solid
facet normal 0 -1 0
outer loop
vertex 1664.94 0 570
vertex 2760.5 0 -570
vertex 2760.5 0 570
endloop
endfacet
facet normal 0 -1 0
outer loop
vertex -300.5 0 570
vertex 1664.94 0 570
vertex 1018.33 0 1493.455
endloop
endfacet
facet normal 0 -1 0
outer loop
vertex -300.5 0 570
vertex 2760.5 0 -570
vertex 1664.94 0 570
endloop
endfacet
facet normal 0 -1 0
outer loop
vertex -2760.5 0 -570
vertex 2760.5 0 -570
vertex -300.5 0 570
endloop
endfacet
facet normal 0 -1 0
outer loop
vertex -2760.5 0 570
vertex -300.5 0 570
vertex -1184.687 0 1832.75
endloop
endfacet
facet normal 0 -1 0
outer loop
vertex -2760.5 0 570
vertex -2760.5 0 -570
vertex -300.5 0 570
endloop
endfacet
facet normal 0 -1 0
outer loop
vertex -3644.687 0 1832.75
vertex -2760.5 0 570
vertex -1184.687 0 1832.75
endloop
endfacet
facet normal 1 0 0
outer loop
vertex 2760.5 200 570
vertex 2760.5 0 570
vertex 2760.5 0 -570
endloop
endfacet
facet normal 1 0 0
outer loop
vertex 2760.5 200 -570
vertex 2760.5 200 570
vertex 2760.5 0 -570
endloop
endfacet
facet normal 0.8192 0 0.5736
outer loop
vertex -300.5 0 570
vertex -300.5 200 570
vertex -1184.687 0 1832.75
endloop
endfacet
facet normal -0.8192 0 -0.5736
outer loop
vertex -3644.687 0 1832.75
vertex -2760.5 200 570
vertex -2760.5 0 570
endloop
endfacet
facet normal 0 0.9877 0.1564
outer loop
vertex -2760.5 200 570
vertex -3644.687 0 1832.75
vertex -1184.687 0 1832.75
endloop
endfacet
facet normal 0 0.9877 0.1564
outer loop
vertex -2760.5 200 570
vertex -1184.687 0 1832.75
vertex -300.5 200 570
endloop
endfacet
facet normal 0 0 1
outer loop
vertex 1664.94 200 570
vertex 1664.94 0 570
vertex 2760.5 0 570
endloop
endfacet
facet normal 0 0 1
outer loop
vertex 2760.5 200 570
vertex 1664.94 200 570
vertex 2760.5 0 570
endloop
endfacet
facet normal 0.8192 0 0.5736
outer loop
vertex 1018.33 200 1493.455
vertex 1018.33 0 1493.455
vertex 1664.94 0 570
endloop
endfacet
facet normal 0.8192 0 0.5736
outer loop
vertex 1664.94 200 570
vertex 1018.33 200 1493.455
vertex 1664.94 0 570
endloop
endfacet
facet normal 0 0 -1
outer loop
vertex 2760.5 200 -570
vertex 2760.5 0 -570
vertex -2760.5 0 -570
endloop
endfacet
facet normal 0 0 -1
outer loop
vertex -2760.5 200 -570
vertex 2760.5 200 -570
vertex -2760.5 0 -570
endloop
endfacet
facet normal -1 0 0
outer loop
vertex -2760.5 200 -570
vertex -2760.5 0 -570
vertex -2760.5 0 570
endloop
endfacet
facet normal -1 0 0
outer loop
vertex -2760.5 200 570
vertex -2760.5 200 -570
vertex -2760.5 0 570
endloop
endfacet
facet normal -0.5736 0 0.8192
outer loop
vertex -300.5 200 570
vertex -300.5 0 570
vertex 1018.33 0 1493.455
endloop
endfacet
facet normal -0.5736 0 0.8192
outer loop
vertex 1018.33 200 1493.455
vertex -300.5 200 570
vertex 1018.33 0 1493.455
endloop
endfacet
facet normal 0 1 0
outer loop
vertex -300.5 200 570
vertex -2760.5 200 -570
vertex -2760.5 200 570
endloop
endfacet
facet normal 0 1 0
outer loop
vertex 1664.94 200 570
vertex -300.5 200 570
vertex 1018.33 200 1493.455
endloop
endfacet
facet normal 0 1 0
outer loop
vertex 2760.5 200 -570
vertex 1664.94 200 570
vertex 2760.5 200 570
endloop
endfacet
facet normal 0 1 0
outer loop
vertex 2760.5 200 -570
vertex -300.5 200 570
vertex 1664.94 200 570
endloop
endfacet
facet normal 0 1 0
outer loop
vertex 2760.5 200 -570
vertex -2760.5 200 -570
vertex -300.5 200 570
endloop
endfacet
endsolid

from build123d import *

# Parameters (mm, degrees)
EXTRUDE_1_DEPTH      = 200
EXTRUDE_3_DEPTH      = 1000
EXTRUDE_3_DEPTH_BACK = 2460
CUT_EXTRUDE_1_DEPTH  = 201


with BuildPart() as part:
    # 草图1 → 凸台-拉伸1 (new body)
    with BuildSketch(Plane(origin=(0, 0, 0), x_dir=(1, 0, 0), z_dir=(0, 1, 0))):
        Polygon((1018.330035249, -1493.454732299), (1664.94, -570), (2760.5, -570), (2760.5, 570), (-2760.5, 570), (-2760.5, -570), (-300.5, -570), align=None)
    extrude(amount=EXTRUDE_1_DEPTH)

    # 草图3 → 凸台-拉伸3 (add, two sides)
    with BuildSketch(Plane.ZY.offset(2760.5)) as extrude_3_sk:
        Polygon((570, 200), (570, 0), (1832.750302935, 0), align=None)
    extrude(amount=EXTRUDE_3_DEPTH)
    extrude(extrude_3_sk.sketch, amount=-EXTRUDE_3_DEPTH_BACK)

    # 草图4 → 切除-拉伸1 (cut, through all)
    with BuildSketch(Plane(origin=(0, 200, 0), x_dir=(1, 0, 0), z_dir=(0, 1, 0))):
        Polygon((-3760.5, -570), (-2760.5, -570), (-3644.687280992, -1832.750302935), (-3760.5, -1832.750302935), align=None)
        Polygon((-1184.687280992, -1832.750302935), (134.142754257, -2756.205035234), (1018.330035249, -1493.454732299), (-300.5, -570), align=None)
    extrude(amount=-CUT_EXTRUDE_1_DEPTH, mode=Mode.SUBTRACT)


solid = part.part
